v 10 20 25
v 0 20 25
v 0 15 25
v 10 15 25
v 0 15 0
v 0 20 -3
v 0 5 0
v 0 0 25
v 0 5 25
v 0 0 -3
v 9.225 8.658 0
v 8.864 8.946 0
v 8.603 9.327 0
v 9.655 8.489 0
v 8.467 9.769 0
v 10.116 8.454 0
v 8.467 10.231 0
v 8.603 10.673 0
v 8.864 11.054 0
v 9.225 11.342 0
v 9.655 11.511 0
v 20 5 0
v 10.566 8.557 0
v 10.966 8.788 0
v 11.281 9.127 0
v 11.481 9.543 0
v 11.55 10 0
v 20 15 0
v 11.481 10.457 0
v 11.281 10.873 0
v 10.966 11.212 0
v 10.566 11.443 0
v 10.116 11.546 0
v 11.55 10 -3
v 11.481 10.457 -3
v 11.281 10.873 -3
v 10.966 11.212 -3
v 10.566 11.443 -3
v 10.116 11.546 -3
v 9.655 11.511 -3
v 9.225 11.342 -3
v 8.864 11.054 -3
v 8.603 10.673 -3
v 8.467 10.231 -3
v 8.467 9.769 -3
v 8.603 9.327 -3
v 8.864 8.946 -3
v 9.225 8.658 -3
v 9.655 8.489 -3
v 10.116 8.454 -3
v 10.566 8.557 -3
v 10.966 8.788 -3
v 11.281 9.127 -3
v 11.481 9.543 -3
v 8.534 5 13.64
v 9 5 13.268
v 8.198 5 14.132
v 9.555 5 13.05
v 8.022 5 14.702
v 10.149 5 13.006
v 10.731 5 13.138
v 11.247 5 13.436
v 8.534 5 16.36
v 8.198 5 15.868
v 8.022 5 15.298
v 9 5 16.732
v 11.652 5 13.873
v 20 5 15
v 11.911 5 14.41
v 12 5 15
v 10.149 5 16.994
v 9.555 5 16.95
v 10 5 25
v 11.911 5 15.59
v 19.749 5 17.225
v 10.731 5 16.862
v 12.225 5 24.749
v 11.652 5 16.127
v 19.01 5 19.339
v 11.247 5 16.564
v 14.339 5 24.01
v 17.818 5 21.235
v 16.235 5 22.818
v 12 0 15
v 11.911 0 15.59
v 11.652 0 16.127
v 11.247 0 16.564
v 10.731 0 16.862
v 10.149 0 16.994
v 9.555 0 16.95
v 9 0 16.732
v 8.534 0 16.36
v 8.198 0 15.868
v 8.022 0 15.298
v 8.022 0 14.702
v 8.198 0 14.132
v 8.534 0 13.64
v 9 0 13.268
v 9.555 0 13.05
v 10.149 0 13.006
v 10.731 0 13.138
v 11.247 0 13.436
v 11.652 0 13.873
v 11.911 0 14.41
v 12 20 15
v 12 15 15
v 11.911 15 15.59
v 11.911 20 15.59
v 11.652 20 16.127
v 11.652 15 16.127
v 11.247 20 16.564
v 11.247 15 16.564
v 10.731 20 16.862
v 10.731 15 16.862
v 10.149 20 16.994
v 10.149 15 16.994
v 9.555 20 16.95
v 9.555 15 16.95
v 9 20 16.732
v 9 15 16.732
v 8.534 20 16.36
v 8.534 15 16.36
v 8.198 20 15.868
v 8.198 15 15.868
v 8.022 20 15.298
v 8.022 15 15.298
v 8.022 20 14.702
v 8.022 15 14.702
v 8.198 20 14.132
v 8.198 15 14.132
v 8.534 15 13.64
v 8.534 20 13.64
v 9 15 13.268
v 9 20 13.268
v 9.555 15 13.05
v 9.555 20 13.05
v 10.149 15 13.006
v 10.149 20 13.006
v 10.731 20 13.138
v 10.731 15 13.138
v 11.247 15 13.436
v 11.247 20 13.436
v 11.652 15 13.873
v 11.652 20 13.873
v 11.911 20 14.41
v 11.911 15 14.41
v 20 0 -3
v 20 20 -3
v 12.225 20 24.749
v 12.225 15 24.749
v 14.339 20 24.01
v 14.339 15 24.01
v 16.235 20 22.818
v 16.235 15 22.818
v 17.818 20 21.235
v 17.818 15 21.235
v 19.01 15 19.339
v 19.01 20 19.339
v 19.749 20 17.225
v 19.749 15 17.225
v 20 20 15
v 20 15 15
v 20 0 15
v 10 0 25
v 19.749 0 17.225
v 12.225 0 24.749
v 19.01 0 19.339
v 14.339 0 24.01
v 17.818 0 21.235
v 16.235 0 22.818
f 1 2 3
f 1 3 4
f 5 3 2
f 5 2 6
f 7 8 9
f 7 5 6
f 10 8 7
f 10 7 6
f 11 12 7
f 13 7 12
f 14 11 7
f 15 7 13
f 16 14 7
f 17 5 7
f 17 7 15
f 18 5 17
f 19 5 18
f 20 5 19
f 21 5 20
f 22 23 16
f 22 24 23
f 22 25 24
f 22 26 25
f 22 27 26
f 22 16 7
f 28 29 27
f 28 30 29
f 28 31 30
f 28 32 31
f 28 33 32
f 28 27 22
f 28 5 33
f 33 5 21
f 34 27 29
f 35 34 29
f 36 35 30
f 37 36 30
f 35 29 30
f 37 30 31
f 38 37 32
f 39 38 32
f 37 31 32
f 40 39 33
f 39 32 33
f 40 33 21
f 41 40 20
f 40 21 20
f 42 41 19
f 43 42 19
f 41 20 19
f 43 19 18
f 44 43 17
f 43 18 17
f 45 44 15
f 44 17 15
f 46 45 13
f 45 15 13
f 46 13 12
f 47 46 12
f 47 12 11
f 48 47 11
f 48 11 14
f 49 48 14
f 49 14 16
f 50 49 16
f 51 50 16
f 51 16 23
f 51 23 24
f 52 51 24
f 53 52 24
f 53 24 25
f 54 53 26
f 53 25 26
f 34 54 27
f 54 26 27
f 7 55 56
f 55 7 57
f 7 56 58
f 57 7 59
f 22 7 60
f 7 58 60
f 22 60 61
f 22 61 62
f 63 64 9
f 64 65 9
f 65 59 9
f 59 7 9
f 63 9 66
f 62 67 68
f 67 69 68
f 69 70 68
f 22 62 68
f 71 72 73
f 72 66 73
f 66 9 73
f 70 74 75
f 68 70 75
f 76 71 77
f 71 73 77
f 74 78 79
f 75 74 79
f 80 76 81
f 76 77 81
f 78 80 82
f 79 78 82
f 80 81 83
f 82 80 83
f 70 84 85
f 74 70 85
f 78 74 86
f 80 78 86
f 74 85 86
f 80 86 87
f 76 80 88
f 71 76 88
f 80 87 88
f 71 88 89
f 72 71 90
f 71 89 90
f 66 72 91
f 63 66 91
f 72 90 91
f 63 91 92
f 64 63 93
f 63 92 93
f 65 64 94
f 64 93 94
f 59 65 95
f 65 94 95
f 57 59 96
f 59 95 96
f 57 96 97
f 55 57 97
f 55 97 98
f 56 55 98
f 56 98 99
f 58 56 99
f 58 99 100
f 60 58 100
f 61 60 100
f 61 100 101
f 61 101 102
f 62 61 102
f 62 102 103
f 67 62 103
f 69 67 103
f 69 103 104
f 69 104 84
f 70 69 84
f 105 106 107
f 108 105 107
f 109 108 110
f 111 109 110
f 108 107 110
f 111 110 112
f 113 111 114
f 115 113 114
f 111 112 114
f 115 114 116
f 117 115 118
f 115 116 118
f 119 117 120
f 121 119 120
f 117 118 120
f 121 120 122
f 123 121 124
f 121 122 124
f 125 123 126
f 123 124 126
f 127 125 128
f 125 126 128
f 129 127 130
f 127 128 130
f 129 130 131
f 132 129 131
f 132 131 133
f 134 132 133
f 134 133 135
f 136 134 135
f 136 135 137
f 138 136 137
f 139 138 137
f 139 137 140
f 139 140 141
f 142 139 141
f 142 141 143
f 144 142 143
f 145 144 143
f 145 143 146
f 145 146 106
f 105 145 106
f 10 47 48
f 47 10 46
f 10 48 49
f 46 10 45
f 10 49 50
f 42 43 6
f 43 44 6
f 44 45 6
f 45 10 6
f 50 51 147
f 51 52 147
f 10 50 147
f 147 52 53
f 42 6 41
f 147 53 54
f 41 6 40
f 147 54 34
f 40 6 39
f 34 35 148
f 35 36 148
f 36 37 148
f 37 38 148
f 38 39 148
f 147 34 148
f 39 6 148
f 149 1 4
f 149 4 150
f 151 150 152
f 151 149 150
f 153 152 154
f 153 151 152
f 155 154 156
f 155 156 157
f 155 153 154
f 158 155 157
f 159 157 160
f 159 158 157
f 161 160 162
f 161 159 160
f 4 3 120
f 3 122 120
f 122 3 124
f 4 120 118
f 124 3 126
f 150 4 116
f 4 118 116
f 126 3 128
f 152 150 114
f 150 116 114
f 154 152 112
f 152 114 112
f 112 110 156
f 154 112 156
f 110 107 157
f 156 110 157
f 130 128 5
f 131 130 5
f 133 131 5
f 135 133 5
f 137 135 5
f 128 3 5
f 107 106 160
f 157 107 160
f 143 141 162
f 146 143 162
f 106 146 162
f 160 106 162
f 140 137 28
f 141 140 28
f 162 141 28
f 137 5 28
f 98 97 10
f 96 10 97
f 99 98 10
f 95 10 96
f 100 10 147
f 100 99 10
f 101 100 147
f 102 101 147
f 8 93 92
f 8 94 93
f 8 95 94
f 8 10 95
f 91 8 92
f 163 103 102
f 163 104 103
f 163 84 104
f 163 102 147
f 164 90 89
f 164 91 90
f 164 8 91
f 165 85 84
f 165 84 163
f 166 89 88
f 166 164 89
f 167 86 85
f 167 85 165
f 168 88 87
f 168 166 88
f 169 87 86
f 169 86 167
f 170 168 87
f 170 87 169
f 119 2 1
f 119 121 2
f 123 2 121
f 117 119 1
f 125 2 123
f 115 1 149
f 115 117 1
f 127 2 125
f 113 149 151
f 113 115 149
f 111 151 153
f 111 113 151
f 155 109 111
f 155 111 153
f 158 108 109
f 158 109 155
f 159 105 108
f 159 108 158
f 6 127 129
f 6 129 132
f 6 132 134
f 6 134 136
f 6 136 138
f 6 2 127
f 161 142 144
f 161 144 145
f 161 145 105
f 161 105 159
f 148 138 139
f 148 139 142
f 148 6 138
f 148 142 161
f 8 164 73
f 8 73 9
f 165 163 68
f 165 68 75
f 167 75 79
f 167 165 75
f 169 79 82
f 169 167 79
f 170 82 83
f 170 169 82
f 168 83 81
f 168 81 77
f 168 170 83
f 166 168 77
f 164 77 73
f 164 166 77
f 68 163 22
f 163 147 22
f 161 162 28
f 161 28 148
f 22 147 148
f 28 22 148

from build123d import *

# Parameters (mm, degrees)
CROQUIS1_W              = 20
CROQUIS1_H              = 20
CROQUIS1_R              = 1.55
SALIENTE_EXTRUIR1_DEPTH = 3
CROQUIS2_W              = 20
CROQUIS2_H              = 5
SALIENTE_EXTRUIR3_DEPTH = 15
SALIENTE_EXTRUIR4_DEPTH = 5
SALIENTE_EXTRUIR5_DEPTH = 5
CROQUIS5_R              = 2
CORTAR_EXTRUIR1_DEPTH   = 21


with BuildPart() as part:
    # Croquis1 → Saliente-Extruir1 (new body)
    with BuildSketch(Plane.XY):
        with Locations((10, 10)):
            Rectangle(CROQUIS1_W, CROQUIS1_H)
        with Locations((10, 10)):
            Circle(CROQUIS1_R, mode=Mode.SUBTRACT)
    extrude(amount=-SALIENTE_EXTRUIR1_DEPTH)

    # Croquis2 → Saliente-Extruir3 (add)
    with BuildSketch(Plane.XY):
        with Locations((10, 2.5)):
            Rectangle(CROQUIS2_W, CROQUIS2_H)
        with Locations((10, 17.5)):
            Rectangle(CROQUIS2_W, CROQUIS2_H)
    extrude(amount=SALIENTE_EXTRUIR3_DEPTH)

    # Croquis3 → Saliente-Extruir4 (add)
    with BuildSketch(Plane(origin=(0, 20, 0), x_dir=(1, 0, 0), z_dir=(0, 1, 0))):
        with BuildLine():
            Line((20, -15), (0, -15))
            Line((0, -15), (0, -25))
            Line((0, -25), (10, -25))
            ThreePointArc((10, -25), (17.071067812, -22.071067812), (20, -15))
        make_face()
    extrude(amount=-SALIENTE_EXTRUIR4_DEPTH)

    # Croquis4 → Saliente-Extruir5 (add)
    with BuildSketch(Plane.XZ):
        with BuildLine():
            Line((0, 15), (20, 15))
            ThreePointArc((20, 15), (17.071067812, 22.071067812), (10, 25))
            Line((10, 25), (0, 25))
            Line((0, 25), (0, 15))
        make_face()
    extrude(amount=-SALIENTE_EXTRUIR5_DEPTH)

    # Croquis5 → Cortar-Extruir1 (cut, through all)
    with BuildSketch(Plane.XZ):
        with Locations((10, 15)):
            Circle(CROQUIS5_R)
    extrude(amount=-CORTAR_EXTRUIR1_DEPTH, mode=Mode.SUBTRACT)


solid = part.part
